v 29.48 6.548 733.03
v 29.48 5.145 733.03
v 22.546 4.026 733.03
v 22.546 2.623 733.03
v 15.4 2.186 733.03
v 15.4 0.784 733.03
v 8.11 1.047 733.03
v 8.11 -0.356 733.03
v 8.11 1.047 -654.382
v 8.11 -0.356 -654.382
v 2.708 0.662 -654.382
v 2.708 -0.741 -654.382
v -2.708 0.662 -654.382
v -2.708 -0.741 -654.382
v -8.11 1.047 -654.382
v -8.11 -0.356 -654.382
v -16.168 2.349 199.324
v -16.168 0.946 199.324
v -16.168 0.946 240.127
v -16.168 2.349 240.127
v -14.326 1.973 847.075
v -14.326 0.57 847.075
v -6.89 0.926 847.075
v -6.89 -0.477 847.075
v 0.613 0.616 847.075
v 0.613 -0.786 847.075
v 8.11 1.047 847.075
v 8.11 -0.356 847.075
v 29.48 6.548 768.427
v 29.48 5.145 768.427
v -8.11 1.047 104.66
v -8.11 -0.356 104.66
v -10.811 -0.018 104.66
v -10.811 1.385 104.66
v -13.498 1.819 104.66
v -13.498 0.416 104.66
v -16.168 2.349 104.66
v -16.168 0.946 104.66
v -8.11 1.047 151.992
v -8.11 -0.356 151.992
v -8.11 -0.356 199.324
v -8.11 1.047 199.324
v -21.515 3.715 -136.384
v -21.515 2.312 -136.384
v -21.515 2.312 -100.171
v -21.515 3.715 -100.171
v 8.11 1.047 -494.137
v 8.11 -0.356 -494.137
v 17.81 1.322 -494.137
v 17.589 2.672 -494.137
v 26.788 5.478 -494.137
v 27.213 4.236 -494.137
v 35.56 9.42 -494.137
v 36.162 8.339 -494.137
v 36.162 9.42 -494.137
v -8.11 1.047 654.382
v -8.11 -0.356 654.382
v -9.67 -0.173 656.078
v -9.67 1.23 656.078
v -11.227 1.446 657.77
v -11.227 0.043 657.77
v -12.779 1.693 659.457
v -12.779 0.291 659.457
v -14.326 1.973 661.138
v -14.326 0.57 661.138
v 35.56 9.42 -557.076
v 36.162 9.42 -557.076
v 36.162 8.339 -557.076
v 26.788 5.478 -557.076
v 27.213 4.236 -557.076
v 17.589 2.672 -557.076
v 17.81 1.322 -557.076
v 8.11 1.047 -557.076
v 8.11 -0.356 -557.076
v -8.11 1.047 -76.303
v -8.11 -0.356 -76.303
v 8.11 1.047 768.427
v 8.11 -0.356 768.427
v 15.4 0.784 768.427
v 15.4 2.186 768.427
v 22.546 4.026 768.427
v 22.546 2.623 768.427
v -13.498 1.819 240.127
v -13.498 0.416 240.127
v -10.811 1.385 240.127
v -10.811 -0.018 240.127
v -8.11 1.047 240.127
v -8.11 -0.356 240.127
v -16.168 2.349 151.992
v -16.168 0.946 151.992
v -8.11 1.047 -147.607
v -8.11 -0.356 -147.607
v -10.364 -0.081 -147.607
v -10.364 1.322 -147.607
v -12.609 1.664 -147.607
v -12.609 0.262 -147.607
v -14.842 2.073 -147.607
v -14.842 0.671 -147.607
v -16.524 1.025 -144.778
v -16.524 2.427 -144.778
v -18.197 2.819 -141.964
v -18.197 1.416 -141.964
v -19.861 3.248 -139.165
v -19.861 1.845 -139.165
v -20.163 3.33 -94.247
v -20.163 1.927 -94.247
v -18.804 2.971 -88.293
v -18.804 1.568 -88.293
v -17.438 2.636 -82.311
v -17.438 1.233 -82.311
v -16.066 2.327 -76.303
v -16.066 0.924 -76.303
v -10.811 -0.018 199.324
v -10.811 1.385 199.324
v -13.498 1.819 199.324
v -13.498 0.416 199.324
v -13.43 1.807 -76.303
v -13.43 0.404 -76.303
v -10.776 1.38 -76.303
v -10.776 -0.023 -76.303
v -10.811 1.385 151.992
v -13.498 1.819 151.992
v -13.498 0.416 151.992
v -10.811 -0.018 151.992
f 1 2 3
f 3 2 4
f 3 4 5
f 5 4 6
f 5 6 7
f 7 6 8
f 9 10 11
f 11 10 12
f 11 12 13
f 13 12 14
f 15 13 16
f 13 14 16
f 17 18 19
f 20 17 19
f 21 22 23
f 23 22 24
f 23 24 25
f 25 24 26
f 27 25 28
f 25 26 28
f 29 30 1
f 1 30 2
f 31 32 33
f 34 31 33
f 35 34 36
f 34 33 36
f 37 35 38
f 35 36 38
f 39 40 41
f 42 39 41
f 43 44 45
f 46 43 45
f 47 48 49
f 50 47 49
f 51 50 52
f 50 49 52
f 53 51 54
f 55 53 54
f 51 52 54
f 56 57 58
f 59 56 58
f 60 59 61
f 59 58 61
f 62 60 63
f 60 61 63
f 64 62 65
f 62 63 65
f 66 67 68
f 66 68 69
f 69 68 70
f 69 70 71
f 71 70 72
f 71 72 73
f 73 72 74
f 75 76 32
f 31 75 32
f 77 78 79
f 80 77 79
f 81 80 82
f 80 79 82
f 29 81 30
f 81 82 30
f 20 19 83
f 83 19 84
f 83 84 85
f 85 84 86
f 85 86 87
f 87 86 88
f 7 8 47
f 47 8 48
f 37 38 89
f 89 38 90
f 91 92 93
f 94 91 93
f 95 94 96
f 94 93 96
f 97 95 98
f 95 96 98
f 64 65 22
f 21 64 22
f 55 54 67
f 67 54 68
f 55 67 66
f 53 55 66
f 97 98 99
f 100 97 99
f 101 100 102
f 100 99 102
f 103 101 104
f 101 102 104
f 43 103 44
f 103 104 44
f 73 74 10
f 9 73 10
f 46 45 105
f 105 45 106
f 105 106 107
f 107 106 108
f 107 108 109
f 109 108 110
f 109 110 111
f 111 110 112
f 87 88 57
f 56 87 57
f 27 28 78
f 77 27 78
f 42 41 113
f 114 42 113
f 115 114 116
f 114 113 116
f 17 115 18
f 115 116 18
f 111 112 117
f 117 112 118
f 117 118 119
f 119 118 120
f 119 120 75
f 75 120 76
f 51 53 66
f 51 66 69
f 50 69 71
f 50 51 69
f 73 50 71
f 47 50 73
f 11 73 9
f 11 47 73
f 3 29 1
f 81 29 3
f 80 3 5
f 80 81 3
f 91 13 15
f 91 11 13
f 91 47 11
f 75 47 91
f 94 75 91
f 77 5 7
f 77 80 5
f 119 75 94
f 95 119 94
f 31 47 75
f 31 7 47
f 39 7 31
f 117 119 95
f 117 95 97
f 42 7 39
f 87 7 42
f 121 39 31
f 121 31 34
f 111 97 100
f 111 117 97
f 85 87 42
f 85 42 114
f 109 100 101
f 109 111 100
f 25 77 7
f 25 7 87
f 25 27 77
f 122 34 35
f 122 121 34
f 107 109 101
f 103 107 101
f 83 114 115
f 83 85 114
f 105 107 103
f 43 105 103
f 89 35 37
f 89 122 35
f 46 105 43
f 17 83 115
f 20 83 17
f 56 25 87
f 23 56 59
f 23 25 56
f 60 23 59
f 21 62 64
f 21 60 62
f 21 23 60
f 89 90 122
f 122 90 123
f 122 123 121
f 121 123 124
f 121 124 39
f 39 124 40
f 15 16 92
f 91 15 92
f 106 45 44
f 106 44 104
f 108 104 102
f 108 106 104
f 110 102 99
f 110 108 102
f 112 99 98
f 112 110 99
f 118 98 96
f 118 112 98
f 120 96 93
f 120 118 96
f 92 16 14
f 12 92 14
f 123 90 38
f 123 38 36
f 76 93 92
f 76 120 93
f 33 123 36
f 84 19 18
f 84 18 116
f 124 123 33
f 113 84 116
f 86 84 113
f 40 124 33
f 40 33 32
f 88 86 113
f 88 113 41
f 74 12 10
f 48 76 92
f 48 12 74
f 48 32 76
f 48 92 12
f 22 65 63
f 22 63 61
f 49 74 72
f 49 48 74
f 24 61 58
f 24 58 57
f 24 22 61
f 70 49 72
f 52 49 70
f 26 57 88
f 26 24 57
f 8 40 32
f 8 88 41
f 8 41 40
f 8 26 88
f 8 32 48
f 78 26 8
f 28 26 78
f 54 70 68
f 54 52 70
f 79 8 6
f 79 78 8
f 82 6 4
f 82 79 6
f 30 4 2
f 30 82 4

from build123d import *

# Parameters (mm, degrees)
F1_DEPTH = 1270
F2_W     = 1980.1401495934
F2_H     = 3113.6045455933
F3_DEPTH = 299.72


with BuildPart() as f1:
    # F0 (on Top) → F1 (new body, symmetric)
    with BuildSketch(Plane.XY):
        with BuildLine():
            Line((0, -0.7886457275), (0, 0))
            Line((0, 0), (0, 0.6140342441))
            ThreePointArc((0, 0.6140342441), (-18.3170854752, 2.8483369264), (-35.56, 9.4202185041))
            Line((-35.56, 9.4202185041), (-38.1, 9.4202185041))
            ThreePointArc((-38.1, 9.4202185041), (-19.7220112368, 1.8078063092), (0, -0.7886457275))
        make_face()
        with BuildLine():
            Line((0, 0.6140342441), (0, 0))
            Line((0, 0), (0, -0.7886457275))
            ThreePointArc((0, -0.7886457275), (19.7220112368, 1.8078063092), (38.1, 9.4202185041))
            Line((38.1, 9.4202185041), (35.56, 9.4202185041))
            ThreePointArc((35.56, 9.4202185041), (18.3170854752, 2.8483369264), (0, 0.6140342441))
        make_face()
    extrude(amount=F1_DEPTH, both=True)

    # F2 (on Front) → F3 (cut, symmetric)
    with BuildSketch(Plane.XZ):
        with Locations((53.6327660084, 57.6152801514)):
            Rectangle(F2_W, F2_H)
        Polygon((8.1096385542, -557.076325627), (8.1096385542, -654.3815261044), (-8.1096385542, -654.3815261044), (-8.1096385542, -557.076325627), (-8.1096385542, -147.6065518649), (-14.8421686747, -147.6065518649), (-21.5153453208, -136.3835978607), (-21.5153453208, -100.1707464551), (-16.0662650602, -76.3029374071), (-8.1096385542, -76.3029374071), (-8.1096385542, 104.6603173018), (-16.1682730924, 104.6603173018), (-16.1682730924, 151.9920442094), (-8.1096385542, 151.9920442094), (-8.1096385542, 199.323771117), (-16.1682730924, 199.323771117), (-16.1682730924, 240.1269839684), (-9.659161472, 240.1269839684), (-8.1096385542, 240.1269839684), (-8.1096385542, 654.3815261044), (-14.3257157907, 661.1377126473), (-14.3257157907, 847.0746987952), (8.1096385542, 847.0746987952), (8.1096385542, 768.4265060241), (29.4803212851, 768.4265060241), (29.4803212851, 733.0297188755), (8.1096385542, 733.0297188755), (8.1096385542, 654.3815261044), (8.1096385542, -494.1373698037), (36.1618473896, -494.1373698037), (36.1618473896, -557.076325627), align=None, mode=Mode.SUBTRACT)
    extrude(amount=F3_DEPTH, both=True, mode=Mode.SUBTRACT)


solid = f1.part
